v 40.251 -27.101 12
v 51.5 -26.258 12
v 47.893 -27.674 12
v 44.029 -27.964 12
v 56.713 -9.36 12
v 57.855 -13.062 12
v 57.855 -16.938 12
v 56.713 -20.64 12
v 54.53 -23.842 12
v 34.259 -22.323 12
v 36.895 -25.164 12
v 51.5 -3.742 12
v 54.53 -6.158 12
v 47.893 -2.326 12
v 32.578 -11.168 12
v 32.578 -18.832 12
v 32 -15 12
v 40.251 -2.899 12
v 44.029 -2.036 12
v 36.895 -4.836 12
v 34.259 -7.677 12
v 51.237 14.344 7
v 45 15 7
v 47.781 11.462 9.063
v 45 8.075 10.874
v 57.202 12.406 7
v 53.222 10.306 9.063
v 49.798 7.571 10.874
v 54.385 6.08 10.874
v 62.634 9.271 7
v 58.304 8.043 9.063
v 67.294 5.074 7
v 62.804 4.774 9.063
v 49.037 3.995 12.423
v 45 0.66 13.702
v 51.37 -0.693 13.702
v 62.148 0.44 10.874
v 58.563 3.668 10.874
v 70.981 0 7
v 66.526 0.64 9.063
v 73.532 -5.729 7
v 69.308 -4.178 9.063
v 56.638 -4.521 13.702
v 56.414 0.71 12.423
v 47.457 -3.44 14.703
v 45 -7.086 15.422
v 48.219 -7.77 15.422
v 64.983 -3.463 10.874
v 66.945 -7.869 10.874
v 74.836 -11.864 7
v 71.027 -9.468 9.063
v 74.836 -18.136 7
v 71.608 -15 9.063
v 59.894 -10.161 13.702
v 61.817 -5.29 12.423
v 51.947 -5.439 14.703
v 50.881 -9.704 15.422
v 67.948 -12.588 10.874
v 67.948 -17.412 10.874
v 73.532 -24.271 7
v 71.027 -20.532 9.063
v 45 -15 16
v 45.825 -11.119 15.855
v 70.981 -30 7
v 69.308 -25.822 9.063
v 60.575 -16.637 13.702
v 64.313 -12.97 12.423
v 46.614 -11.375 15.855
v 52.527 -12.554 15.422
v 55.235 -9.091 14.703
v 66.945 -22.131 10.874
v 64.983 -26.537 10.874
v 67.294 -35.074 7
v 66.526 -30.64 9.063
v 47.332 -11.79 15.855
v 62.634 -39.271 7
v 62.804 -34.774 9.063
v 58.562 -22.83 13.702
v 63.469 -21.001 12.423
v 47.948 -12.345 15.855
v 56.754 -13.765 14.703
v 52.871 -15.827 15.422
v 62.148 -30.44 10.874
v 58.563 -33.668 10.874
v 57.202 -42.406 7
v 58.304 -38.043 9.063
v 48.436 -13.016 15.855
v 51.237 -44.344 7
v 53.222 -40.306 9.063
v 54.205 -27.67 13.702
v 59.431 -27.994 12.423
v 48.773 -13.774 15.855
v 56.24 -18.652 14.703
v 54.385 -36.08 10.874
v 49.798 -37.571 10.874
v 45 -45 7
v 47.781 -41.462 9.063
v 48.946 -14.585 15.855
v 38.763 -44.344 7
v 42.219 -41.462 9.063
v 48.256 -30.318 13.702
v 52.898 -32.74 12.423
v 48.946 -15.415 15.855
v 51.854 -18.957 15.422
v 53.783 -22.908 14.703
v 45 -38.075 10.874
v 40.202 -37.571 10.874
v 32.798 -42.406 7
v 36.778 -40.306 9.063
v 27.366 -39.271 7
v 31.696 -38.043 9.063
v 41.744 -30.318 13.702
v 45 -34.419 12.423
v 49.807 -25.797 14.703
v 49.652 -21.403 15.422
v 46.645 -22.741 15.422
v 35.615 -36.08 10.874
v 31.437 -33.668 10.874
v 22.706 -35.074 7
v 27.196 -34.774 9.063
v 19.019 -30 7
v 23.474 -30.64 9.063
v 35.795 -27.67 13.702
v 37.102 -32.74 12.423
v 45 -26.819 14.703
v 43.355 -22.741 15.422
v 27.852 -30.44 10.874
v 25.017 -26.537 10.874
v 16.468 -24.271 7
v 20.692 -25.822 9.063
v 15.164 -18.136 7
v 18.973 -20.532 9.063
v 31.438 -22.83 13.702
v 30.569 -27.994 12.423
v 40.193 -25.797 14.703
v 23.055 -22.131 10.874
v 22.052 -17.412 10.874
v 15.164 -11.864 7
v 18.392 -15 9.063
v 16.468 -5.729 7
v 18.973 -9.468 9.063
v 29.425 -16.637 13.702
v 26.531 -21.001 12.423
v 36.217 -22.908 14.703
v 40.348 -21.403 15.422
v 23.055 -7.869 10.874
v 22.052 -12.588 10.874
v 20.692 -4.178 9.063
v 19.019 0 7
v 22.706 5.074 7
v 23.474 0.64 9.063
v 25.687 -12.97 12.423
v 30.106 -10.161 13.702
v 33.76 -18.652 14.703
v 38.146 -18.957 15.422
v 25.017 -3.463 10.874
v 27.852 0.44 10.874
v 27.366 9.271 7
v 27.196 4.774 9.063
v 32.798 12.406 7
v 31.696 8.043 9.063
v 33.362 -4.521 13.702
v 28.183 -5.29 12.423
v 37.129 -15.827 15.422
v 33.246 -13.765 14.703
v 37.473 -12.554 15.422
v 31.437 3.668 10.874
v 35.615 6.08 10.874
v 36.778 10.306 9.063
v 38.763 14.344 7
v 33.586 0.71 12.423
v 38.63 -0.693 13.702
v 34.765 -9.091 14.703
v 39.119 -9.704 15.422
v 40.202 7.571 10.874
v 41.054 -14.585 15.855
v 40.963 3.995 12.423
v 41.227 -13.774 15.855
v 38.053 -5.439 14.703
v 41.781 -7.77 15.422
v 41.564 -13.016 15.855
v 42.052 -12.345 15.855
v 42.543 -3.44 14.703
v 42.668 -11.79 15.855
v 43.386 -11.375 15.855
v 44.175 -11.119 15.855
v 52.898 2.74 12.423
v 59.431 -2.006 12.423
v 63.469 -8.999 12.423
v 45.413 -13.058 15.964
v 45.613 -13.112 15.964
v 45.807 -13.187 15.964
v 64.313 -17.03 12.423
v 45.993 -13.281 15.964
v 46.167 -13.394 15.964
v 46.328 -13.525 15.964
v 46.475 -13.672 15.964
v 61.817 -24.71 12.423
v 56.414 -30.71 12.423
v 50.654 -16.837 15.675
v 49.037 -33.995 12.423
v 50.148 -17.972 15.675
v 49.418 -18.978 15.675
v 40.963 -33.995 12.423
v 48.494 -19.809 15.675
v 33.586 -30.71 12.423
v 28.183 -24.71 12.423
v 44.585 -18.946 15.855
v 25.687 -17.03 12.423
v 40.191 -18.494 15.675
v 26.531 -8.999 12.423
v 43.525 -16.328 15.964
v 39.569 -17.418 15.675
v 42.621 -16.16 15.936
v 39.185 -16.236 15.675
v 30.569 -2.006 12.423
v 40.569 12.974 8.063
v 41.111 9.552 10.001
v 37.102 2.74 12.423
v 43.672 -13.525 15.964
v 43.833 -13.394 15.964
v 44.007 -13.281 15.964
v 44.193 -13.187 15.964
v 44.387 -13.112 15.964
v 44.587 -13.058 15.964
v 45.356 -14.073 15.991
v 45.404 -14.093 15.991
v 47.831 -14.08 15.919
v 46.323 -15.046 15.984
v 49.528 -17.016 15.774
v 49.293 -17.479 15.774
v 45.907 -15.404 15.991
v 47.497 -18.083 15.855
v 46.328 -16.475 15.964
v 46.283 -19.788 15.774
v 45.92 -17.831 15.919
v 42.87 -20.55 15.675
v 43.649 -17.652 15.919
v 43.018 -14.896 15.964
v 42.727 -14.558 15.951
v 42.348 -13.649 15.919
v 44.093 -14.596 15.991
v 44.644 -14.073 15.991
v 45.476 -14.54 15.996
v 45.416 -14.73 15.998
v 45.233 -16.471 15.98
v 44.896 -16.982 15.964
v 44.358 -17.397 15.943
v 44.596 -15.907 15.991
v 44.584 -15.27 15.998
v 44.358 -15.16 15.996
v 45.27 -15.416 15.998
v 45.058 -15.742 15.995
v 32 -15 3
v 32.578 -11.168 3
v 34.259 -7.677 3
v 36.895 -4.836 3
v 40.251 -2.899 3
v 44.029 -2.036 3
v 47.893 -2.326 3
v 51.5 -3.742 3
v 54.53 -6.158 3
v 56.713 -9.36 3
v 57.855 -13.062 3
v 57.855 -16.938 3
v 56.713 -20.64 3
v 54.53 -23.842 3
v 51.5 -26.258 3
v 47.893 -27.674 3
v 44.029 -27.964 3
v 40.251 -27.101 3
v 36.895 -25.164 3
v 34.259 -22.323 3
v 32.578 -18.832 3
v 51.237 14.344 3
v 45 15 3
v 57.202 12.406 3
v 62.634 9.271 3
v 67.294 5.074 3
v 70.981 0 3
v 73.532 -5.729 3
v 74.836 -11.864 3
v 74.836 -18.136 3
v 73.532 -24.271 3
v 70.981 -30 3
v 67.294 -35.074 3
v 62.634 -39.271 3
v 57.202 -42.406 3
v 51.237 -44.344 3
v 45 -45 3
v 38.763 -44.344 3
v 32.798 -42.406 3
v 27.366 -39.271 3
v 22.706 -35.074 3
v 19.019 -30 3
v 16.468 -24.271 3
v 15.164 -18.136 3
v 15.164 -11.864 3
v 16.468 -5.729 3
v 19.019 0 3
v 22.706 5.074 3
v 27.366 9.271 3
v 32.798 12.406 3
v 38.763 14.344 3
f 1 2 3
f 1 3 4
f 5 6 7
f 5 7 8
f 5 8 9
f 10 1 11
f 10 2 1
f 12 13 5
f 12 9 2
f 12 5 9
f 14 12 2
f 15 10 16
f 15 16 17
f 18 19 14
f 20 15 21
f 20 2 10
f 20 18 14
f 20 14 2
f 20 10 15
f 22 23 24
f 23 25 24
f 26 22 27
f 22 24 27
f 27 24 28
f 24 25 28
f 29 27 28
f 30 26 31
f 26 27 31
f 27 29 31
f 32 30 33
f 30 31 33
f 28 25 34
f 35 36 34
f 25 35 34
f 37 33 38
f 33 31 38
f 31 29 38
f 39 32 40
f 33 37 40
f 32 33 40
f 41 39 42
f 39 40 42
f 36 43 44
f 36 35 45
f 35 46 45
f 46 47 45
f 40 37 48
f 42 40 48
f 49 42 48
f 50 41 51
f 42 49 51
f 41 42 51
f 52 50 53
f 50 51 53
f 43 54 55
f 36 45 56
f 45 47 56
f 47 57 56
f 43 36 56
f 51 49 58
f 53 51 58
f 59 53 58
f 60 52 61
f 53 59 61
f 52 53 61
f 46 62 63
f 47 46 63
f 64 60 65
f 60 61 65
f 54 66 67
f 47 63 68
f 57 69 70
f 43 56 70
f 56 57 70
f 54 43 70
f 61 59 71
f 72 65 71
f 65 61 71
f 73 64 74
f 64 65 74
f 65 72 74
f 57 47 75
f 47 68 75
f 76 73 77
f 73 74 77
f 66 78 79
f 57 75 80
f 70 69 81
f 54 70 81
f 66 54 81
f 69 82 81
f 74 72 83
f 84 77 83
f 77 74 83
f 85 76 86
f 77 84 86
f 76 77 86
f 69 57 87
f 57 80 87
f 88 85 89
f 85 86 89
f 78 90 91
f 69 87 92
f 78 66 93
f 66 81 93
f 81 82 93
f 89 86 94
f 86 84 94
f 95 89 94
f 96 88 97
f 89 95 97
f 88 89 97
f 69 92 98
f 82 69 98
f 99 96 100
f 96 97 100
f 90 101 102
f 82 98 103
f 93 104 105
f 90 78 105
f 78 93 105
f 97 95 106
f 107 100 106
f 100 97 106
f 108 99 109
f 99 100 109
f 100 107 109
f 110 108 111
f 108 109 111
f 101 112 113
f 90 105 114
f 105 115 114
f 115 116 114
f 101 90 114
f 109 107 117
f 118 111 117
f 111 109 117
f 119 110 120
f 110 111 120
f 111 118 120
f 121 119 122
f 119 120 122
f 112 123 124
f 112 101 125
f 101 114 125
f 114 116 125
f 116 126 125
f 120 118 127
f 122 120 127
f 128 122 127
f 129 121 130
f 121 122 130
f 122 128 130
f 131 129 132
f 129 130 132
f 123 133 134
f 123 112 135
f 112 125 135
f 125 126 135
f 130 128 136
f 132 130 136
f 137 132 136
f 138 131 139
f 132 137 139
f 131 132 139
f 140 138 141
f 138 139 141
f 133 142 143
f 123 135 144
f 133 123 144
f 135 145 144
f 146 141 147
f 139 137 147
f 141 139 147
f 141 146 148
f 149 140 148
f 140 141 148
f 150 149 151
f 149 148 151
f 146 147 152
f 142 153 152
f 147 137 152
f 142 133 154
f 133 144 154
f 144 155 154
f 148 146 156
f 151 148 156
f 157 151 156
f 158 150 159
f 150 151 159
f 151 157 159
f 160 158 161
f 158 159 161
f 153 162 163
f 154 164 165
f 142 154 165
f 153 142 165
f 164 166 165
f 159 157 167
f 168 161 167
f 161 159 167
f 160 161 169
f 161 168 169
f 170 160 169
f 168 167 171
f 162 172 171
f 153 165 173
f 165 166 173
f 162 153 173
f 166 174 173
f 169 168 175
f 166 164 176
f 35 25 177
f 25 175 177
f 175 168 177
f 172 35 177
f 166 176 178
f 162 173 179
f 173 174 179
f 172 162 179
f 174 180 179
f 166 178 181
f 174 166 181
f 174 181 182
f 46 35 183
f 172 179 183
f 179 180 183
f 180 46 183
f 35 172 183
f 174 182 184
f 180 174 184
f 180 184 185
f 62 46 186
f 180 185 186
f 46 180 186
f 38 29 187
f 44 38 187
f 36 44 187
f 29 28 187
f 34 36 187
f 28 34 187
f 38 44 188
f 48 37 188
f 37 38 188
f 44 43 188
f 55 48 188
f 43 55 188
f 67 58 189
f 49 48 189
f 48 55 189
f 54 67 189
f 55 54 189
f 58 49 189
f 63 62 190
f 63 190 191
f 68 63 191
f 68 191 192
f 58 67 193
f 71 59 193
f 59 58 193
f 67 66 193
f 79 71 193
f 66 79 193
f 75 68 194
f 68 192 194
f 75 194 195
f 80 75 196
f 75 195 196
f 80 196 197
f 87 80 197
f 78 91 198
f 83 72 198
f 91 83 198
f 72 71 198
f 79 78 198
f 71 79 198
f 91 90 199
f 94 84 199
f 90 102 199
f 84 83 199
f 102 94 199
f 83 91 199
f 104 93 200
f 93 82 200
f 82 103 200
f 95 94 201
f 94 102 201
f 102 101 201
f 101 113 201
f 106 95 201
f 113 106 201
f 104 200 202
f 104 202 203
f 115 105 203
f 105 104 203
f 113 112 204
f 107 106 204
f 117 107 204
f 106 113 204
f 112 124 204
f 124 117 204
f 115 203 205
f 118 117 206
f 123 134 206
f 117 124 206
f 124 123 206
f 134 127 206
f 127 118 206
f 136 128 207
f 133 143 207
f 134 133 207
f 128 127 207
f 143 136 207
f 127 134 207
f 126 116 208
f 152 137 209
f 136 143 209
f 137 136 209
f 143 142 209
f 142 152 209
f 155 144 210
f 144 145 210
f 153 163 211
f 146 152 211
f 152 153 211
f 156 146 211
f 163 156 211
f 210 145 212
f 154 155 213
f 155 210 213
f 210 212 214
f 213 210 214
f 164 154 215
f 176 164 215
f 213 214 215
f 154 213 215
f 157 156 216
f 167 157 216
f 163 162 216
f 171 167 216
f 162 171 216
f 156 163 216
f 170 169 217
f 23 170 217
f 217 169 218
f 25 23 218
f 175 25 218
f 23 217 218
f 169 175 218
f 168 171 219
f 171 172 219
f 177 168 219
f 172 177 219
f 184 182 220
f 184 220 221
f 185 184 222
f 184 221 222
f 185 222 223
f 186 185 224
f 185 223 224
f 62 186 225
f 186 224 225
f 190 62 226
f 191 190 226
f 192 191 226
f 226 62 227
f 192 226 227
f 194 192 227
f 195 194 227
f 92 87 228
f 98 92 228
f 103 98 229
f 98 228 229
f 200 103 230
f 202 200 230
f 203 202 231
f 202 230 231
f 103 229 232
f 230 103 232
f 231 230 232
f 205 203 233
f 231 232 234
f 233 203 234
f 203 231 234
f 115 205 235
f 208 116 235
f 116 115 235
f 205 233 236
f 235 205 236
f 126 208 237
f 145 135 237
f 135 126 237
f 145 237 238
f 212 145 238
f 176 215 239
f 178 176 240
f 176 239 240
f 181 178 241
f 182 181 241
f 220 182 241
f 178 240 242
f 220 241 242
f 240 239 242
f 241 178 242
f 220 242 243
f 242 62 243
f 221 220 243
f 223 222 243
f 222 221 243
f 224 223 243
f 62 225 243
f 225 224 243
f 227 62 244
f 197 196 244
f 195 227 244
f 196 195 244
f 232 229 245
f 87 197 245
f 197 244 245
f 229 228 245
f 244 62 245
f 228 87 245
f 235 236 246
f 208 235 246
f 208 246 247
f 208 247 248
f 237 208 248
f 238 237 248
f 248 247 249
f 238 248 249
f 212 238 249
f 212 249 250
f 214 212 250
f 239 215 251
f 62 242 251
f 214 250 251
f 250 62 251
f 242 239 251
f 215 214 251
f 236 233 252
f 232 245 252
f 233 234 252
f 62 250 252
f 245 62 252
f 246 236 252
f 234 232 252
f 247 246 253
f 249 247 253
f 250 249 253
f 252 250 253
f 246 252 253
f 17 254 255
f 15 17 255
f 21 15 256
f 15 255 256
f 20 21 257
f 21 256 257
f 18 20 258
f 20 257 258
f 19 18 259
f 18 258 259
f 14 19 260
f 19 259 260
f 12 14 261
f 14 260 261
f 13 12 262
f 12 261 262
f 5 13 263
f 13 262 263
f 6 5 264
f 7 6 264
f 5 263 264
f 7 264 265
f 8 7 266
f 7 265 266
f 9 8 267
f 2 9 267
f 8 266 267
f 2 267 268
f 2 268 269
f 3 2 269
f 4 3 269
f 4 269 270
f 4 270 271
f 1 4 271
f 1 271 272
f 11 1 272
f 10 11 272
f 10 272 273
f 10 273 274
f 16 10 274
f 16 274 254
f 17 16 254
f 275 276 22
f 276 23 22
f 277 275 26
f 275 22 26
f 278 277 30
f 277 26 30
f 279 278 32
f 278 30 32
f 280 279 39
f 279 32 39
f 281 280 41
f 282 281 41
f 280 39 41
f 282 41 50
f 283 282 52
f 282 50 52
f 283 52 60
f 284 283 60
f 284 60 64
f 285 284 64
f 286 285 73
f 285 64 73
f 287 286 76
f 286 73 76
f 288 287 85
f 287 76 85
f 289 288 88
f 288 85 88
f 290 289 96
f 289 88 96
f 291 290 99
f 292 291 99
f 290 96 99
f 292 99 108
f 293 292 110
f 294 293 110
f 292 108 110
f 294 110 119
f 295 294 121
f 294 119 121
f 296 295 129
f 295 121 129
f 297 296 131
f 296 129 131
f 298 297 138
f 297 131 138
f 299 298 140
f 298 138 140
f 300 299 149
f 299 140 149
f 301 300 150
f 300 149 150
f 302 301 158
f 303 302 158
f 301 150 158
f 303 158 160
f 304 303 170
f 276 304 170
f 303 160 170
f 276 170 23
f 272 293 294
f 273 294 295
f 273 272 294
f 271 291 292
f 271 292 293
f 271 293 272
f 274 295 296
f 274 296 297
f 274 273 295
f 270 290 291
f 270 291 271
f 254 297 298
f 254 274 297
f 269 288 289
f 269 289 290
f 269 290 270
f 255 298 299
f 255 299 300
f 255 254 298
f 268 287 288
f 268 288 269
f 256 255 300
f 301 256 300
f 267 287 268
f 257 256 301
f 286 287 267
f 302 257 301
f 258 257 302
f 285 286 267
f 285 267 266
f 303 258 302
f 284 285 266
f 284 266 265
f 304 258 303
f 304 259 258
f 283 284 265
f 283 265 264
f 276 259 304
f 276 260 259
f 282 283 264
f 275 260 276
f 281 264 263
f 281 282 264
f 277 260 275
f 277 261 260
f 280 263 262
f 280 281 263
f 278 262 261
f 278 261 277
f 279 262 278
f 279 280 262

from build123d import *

# Parameters (mm, degrees)
CYLINDER_R     = 13
CYLINDER_DEPTH = 15


with BuildPart() as thin:
    # Cylinder → Cylinder (new body)
    with BuildSketch(Plane(origin=(-45, -15, -3), x_dir=(1, 0, 0), z_dir=(0, 0, 1))):
        Circle(CYLINDER_R)
    extrude(amount=CYLINDER_DEPTH)


with BuildPart() as mushroom:
    # Sketch001 → Revolve (revolve)
    with BuildSketch(Plane.YZ):
        with BuildLine():
            Line((30, -4), (30, 0))
            ThreePointArc((30, 0), (15.66046, 6.701533), (0, 9))
            Line((0, -4), (0, 9))
            Line((30, -4), (0, -4))
        make_face()
    revolve(axis=Axis((0, 0, 0), (0, 0, 1)))


with BuildPart() as mushroom_1:
    # Revolve placement: moved
    add(mushroom.part.moved(Location((-45, -15, 7))))

    # Cut: cut Thin
    add(thin.part, mode=Mode.SUBTRACT)


with BuildPart() as part_mirroring001:
    # Part__Mirroring001: instance of Mushroom
    add(mushroom_1.part.mirror(Plane(origin=(1e-06, -15, 8.5), x_dir=(0, -1, 0), z_dir=(1, 0, 0))))


solid = part_mirroring001.part
